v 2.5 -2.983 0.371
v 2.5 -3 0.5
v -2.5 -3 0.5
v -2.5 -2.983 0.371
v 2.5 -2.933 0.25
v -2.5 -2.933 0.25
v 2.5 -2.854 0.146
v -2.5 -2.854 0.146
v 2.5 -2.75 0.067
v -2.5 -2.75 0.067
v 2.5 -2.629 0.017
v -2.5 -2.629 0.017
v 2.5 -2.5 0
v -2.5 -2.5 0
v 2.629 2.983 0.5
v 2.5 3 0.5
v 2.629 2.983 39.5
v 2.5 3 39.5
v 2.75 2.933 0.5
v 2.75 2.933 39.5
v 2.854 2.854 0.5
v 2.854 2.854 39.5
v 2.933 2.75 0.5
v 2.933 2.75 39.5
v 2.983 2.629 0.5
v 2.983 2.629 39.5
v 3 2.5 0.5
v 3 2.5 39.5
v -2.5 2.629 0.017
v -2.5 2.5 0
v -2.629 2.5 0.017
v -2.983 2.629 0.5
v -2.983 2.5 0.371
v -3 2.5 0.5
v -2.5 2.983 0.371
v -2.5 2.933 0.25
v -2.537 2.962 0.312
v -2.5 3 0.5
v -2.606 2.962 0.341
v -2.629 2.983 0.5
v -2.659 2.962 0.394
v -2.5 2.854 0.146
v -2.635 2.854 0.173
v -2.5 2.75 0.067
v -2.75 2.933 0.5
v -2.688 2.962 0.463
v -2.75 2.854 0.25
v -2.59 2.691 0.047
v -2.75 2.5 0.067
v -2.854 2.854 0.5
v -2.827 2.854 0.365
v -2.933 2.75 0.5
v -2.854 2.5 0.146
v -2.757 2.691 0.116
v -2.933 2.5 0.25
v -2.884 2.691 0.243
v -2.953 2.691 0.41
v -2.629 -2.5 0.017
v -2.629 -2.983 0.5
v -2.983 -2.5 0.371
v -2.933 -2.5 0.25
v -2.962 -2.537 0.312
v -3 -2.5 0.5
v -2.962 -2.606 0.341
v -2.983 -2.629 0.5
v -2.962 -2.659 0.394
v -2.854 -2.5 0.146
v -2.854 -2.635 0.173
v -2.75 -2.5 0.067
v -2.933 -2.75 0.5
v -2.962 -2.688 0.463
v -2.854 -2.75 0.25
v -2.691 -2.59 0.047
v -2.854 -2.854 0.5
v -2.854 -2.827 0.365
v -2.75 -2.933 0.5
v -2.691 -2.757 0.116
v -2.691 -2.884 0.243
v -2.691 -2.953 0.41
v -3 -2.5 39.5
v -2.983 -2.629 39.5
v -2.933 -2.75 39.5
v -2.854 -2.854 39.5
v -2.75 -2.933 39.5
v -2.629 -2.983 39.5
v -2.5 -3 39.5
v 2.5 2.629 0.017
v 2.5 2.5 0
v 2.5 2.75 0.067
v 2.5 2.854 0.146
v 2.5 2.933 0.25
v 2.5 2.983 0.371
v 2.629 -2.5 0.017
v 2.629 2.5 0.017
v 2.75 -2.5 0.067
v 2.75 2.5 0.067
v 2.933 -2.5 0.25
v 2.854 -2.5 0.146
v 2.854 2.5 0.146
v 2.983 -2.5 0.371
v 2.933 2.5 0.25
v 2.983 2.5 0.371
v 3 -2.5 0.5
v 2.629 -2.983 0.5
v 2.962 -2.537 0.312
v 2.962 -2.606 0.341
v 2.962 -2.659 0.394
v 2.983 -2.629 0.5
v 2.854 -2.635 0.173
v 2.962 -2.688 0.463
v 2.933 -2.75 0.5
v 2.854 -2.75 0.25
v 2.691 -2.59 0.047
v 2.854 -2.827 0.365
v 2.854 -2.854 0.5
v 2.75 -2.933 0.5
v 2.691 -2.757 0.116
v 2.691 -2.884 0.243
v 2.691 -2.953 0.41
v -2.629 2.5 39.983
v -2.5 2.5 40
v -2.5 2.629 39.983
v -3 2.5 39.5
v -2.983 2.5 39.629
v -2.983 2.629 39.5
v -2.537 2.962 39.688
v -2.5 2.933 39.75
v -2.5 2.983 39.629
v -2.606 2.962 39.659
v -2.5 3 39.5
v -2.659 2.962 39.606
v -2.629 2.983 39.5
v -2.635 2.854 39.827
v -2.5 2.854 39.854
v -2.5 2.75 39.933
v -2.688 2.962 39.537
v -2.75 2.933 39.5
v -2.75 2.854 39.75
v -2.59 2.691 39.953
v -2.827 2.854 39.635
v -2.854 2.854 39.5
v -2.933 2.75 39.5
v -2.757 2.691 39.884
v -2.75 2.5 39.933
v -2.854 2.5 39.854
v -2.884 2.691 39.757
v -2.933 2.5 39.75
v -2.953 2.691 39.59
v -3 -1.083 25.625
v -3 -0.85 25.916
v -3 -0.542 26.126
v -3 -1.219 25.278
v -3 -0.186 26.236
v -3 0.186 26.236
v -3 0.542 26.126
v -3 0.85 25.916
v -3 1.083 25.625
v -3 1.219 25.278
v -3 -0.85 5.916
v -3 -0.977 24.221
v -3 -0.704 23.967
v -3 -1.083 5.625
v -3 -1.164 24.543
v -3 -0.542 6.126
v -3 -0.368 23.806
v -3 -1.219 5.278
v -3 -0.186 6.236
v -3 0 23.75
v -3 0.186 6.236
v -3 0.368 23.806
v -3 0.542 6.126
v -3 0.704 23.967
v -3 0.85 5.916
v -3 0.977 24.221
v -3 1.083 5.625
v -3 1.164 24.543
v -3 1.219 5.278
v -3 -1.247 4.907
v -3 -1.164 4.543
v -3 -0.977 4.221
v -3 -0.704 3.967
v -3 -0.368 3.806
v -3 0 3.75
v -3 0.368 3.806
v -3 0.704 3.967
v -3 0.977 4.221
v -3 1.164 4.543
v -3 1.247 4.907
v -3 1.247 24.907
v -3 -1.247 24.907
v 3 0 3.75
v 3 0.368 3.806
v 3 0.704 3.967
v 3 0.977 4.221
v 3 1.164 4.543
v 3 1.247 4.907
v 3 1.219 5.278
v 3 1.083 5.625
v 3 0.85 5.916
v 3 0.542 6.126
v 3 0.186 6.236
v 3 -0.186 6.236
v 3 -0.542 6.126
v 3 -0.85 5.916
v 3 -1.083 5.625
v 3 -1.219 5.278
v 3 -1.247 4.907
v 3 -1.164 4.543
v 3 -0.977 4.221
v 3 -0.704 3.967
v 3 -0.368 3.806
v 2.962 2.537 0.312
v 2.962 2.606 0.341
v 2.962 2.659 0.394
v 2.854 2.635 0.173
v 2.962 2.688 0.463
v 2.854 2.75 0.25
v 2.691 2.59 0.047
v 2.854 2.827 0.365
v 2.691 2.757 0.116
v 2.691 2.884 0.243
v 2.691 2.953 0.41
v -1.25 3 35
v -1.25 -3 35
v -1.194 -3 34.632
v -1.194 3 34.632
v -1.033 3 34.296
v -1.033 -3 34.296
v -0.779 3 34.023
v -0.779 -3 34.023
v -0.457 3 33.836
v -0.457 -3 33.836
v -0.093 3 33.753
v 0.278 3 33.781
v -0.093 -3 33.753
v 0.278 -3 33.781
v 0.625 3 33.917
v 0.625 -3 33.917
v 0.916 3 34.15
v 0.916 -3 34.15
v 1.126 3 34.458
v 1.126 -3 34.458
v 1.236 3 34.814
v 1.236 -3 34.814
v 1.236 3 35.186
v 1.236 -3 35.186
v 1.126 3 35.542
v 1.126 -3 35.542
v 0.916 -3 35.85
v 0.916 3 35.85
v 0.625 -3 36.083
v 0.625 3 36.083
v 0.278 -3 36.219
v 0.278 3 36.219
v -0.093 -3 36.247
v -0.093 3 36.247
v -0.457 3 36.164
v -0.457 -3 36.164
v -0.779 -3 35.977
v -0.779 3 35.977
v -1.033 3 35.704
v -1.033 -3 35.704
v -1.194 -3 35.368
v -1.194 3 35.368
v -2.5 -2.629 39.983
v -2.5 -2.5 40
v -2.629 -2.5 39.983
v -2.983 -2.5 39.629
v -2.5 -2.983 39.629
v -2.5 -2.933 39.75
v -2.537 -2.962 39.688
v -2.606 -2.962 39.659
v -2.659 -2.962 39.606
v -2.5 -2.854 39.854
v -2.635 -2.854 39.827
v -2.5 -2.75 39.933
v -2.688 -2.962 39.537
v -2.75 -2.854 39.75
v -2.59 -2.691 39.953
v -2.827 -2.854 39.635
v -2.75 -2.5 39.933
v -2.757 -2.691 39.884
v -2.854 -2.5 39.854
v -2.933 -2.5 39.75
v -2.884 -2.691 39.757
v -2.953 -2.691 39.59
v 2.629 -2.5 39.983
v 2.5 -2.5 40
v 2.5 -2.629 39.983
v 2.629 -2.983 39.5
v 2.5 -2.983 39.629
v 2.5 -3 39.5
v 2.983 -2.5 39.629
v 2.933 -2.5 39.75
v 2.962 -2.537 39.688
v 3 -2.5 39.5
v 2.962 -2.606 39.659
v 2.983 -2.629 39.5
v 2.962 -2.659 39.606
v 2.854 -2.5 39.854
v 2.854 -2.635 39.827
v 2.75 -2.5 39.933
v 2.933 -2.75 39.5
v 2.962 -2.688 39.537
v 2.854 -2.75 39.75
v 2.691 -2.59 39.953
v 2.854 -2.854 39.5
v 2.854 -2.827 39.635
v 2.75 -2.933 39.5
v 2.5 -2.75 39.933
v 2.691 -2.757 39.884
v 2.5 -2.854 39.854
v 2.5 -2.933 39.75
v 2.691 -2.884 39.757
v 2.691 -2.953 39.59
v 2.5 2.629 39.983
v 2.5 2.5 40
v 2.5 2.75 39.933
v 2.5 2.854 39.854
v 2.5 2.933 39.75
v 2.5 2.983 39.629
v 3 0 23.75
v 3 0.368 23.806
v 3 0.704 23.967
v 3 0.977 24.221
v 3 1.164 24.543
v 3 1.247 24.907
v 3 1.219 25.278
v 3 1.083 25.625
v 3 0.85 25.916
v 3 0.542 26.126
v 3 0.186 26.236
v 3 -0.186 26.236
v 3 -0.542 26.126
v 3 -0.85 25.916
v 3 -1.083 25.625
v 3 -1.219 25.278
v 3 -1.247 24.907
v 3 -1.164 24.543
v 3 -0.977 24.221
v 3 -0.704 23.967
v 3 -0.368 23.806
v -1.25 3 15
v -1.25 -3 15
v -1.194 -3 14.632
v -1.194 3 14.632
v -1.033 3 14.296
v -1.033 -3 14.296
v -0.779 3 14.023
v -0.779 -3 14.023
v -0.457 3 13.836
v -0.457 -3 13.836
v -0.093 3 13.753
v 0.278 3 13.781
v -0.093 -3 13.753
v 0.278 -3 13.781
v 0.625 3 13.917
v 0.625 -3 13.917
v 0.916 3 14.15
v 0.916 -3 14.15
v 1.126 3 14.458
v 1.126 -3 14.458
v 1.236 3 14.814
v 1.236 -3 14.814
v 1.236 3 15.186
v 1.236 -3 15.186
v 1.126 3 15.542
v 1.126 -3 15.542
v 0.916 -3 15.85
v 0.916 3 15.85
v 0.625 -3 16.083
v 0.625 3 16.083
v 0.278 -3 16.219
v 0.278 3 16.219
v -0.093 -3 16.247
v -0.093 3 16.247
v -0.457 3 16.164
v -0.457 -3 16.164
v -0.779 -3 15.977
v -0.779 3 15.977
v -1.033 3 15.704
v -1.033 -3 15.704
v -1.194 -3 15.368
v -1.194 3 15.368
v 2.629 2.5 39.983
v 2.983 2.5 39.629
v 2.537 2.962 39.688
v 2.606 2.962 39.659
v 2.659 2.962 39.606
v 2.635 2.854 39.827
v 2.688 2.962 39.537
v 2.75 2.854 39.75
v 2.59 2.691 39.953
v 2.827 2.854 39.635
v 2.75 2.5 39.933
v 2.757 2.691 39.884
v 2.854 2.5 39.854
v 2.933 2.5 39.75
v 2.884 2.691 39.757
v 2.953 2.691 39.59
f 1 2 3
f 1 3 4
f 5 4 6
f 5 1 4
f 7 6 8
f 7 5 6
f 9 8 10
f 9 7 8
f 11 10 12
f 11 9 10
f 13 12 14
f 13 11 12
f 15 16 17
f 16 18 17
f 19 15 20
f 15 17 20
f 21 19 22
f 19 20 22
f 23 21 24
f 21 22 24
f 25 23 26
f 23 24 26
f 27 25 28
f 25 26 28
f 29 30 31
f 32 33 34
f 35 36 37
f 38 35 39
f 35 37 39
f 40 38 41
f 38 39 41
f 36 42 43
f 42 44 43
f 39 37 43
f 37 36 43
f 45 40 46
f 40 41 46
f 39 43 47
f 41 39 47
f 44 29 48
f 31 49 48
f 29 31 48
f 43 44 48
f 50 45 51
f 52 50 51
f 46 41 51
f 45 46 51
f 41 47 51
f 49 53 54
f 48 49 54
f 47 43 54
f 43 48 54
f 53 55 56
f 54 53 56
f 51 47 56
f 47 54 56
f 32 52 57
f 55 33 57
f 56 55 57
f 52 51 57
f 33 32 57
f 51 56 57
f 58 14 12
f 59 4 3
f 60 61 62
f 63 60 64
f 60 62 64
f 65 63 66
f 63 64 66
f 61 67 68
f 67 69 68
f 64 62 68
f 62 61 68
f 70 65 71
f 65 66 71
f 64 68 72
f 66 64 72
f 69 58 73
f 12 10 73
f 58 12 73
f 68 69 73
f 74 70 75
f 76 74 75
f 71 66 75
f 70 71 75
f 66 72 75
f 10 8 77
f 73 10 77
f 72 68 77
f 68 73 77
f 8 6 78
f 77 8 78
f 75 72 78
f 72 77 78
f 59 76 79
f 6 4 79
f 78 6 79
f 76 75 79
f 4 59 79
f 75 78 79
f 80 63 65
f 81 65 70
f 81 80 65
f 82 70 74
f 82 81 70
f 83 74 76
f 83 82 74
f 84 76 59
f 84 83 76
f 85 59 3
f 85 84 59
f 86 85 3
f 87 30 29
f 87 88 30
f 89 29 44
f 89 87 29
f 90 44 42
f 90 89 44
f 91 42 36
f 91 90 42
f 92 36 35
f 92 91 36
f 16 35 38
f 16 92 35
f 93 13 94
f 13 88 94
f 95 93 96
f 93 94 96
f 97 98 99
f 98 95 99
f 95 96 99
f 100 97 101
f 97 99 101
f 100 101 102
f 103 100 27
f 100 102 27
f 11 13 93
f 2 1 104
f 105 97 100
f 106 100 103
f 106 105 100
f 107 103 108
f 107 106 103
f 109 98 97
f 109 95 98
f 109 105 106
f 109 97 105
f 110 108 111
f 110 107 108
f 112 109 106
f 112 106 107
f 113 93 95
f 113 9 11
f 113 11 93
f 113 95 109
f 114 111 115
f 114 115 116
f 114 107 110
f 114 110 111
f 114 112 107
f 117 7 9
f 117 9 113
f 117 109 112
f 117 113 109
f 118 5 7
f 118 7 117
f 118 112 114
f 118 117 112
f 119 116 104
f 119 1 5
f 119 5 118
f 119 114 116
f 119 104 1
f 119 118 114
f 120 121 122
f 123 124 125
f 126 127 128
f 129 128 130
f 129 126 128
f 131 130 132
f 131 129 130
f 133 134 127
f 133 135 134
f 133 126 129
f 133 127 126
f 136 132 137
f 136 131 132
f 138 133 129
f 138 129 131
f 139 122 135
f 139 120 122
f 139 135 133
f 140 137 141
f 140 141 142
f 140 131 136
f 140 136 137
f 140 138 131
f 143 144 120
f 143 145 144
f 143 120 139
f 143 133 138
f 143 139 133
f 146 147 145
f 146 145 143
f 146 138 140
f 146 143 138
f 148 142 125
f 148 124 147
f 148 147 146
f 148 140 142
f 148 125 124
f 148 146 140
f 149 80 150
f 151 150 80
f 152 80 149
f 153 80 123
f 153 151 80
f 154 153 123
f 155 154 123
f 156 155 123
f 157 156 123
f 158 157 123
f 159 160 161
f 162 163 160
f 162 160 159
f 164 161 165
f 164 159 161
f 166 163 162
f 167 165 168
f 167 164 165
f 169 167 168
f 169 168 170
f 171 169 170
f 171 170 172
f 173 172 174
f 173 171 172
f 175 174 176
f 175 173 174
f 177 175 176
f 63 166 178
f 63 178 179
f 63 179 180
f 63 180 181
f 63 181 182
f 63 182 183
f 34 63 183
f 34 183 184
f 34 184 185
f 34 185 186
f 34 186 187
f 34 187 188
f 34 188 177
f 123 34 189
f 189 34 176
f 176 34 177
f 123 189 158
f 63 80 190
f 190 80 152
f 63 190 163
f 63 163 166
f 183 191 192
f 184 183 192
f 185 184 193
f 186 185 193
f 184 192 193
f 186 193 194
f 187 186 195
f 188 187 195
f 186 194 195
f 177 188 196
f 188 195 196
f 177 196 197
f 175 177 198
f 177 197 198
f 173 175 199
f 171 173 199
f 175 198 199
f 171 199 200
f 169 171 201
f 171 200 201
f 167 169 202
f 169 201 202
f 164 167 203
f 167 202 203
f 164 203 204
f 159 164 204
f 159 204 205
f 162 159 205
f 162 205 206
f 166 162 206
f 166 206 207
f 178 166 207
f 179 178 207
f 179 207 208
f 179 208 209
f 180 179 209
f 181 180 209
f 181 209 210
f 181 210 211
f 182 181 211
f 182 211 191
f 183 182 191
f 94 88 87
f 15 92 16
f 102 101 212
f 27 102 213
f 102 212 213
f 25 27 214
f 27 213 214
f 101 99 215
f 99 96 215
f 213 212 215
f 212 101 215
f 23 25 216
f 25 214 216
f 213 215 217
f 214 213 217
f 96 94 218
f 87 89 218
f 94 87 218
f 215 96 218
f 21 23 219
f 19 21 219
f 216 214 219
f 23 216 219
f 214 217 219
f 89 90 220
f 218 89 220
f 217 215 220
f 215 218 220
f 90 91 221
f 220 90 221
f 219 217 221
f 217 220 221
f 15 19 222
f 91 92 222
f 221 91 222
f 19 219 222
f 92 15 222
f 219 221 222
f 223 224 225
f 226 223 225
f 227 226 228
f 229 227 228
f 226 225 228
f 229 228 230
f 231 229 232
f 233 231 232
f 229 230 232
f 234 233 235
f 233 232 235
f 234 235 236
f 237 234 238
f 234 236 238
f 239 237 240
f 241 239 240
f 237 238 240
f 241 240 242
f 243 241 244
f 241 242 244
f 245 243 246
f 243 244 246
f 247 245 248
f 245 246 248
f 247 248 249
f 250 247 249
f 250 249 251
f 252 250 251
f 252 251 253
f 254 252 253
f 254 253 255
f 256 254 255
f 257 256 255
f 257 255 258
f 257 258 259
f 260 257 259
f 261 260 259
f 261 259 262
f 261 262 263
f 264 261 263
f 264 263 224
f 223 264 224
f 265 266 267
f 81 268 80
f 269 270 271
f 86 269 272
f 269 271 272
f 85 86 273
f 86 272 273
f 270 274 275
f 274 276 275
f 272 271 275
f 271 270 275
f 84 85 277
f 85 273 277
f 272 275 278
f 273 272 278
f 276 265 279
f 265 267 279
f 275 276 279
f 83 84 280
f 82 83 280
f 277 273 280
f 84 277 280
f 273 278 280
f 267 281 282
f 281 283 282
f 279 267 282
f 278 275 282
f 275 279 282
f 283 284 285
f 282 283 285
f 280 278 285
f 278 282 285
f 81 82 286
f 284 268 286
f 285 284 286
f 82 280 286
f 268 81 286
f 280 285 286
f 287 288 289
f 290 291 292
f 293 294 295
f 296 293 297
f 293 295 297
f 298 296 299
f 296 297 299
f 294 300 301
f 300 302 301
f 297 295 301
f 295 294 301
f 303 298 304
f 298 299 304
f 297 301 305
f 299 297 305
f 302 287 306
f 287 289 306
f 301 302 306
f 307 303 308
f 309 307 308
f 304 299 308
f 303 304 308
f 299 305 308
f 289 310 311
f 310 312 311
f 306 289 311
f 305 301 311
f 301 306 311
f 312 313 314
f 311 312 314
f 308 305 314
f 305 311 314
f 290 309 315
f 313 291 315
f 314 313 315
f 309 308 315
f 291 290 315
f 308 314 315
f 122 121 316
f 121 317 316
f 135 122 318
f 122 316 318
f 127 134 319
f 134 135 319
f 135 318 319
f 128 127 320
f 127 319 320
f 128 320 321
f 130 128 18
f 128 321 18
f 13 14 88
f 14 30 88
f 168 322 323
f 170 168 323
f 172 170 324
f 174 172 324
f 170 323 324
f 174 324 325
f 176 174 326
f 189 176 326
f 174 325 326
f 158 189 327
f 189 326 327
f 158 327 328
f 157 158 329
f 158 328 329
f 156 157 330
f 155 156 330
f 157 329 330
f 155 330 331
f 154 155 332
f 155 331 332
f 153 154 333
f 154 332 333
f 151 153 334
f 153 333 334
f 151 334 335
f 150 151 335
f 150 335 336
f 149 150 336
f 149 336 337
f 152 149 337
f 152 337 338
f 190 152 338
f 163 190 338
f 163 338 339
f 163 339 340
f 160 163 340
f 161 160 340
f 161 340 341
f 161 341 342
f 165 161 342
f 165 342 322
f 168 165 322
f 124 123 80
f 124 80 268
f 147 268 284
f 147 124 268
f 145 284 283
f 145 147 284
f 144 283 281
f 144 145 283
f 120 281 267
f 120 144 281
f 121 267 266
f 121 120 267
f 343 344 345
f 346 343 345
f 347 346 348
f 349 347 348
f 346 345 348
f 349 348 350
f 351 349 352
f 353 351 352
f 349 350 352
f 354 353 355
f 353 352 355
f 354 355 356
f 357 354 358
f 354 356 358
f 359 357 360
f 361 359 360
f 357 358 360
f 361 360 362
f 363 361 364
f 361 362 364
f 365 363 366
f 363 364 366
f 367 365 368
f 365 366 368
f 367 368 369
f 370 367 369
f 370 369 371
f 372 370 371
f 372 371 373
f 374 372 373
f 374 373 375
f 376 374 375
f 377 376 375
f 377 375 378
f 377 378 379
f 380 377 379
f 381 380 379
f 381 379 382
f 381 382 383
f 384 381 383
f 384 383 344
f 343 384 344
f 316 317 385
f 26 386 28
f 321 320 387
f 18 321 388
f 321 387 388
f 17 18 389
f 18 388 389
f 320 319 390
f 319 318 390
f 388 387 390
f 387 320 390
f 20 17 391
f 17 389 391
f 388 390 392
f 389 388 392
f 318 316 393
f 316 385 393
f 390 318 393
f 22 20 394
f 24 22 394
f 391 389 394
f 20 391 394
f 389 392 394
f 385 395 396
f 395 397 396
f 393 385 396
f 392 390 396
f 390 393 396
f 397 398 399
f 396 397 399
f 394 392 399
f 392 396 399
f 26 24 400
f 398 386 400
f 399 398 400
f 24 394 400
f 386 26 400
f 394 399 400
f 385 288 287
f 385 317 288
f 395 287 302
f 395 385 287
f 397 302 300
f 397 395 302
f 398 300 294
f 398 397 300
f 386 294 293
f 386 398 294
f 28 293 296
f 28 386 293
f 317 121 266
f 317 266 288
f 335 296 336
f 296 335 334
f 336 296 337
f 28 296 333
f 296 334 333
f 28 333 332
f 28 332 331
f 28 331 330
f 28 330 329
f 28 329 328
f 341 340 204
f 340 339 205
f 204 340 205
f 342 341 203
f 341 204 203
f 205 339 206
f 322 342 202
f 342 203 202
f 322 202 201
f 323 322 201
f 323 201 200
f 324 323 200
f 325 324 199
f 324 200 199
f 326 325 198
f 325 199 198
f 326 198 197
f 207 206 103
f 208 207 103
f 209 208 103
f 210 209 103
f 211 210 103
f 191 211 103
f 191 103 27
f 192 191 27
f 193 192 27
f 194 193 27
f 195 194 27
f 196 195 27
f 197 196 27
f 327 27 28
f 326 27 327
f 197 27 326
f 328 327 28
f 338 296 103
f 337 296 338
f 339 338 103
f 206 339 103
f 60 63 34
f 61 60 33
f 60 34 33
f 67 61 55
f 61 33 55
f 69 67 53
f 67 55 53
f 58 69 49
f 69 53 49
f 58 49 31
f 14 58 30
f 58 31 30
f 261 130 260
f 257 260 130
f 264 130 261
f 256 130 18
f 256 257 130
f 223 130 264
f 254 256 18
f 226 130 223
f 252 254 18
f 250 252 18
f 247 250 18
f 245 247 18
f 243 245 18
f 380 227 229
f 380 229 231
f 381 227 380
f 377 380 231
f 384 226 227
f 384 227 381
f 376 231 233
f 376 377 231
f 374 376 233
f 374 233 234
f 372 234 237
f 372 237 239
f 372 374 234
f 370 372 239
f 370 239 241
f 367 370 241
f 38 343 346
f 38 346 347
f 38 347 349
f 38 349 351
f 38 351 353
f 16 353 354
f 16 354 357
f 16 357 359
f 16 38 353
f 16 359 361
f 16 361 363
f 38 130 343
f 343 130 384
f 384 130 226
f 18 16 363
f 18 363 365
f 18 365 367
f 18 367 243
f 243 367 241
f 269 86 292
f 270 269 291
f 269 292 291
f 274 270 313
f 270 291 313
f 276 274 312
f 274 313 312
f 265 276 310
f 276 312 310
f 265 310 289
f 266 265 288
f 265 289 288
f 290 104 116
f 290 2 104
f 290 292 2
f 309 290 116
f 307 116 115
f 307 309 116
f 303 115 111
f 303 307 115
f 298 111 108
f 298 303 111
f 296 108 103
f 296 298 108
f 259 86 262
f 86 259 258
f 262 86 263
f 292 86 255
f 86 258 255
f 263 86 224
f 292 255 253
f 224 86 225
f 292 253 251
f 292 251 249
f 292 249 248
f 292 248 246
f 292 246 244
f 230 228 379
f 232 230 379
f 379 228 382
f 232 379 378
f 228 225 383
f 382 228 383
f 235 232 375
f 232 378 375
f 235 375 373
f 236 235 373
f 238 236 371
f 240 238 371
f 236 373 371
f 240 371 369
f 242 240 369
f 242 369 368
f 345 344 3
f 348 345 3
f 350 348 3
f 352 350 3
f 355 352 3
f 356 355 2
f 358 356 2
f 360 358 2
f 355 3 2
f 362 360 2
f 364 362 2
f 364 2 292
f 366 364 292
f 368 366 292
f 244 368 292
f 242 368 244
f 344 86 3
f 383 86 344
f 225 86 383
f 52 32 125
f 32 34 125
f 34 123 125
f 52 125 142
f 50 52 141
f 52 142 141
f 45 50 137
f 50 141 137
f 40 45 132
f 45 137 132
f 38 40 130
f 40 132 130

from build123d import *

# Parameters (mm, degrees)
SKETCH_1_W         = 6
SKETCH_1_H         = 6
EXTRUDE_1_DEPTH    = 40
HOLE_WIZARD_M3_1_D = 2.5
HOLE_WIZARD_M3_2_D = 2.5
FILLET_1_R         = 0.5


with BuildPart() as part:
    # 草图1 → 凸台-拉伸1 (new body)
    with BuildSketch(Plane.XY):
        Rectangle(SKETCH_1_W, SKETCH_1_H)
    extrude(amount=EXTRUDE_1_DEPTH)

    # M3 螺纹孔1 (through all)
    with Locations(Plane(origin=(0, 3, 0), x_dir=(1, 0, 0), z_dir=(0, 1, 0))):
        with Locations((0, -35), (0, -15)):
            Hole(HOLE_WIZARD_M3_1_D / 2)

    # M3 螺纹孔2 (through all)
    with Locations(Plane.ZY.offset(3)):
        with Locations((5, 0), (25, 0)):
            Hole(HOLE_WIZARD_M3_2_D / 2)

    # 圆角1
    fillet_1_edges = [part.edges().sort_by_distance(p)[0] for p in [
        (-3, 0, 40),
        (0, -3, 40),
        (3, 0, 40),
        (0, -3, 0),
        (-3, 0, 0),
        (0, 3, 0),
        (3, 0, 0),
        (0, 3, 40),
        (3, -3, 20),
        (-3, -3, 20),
        (-3, 3, 20),
        (3, 3, 20),
    ]]
    fillet(fillet_1_edges, radius=FILLET_1_R)


solid = part.part
